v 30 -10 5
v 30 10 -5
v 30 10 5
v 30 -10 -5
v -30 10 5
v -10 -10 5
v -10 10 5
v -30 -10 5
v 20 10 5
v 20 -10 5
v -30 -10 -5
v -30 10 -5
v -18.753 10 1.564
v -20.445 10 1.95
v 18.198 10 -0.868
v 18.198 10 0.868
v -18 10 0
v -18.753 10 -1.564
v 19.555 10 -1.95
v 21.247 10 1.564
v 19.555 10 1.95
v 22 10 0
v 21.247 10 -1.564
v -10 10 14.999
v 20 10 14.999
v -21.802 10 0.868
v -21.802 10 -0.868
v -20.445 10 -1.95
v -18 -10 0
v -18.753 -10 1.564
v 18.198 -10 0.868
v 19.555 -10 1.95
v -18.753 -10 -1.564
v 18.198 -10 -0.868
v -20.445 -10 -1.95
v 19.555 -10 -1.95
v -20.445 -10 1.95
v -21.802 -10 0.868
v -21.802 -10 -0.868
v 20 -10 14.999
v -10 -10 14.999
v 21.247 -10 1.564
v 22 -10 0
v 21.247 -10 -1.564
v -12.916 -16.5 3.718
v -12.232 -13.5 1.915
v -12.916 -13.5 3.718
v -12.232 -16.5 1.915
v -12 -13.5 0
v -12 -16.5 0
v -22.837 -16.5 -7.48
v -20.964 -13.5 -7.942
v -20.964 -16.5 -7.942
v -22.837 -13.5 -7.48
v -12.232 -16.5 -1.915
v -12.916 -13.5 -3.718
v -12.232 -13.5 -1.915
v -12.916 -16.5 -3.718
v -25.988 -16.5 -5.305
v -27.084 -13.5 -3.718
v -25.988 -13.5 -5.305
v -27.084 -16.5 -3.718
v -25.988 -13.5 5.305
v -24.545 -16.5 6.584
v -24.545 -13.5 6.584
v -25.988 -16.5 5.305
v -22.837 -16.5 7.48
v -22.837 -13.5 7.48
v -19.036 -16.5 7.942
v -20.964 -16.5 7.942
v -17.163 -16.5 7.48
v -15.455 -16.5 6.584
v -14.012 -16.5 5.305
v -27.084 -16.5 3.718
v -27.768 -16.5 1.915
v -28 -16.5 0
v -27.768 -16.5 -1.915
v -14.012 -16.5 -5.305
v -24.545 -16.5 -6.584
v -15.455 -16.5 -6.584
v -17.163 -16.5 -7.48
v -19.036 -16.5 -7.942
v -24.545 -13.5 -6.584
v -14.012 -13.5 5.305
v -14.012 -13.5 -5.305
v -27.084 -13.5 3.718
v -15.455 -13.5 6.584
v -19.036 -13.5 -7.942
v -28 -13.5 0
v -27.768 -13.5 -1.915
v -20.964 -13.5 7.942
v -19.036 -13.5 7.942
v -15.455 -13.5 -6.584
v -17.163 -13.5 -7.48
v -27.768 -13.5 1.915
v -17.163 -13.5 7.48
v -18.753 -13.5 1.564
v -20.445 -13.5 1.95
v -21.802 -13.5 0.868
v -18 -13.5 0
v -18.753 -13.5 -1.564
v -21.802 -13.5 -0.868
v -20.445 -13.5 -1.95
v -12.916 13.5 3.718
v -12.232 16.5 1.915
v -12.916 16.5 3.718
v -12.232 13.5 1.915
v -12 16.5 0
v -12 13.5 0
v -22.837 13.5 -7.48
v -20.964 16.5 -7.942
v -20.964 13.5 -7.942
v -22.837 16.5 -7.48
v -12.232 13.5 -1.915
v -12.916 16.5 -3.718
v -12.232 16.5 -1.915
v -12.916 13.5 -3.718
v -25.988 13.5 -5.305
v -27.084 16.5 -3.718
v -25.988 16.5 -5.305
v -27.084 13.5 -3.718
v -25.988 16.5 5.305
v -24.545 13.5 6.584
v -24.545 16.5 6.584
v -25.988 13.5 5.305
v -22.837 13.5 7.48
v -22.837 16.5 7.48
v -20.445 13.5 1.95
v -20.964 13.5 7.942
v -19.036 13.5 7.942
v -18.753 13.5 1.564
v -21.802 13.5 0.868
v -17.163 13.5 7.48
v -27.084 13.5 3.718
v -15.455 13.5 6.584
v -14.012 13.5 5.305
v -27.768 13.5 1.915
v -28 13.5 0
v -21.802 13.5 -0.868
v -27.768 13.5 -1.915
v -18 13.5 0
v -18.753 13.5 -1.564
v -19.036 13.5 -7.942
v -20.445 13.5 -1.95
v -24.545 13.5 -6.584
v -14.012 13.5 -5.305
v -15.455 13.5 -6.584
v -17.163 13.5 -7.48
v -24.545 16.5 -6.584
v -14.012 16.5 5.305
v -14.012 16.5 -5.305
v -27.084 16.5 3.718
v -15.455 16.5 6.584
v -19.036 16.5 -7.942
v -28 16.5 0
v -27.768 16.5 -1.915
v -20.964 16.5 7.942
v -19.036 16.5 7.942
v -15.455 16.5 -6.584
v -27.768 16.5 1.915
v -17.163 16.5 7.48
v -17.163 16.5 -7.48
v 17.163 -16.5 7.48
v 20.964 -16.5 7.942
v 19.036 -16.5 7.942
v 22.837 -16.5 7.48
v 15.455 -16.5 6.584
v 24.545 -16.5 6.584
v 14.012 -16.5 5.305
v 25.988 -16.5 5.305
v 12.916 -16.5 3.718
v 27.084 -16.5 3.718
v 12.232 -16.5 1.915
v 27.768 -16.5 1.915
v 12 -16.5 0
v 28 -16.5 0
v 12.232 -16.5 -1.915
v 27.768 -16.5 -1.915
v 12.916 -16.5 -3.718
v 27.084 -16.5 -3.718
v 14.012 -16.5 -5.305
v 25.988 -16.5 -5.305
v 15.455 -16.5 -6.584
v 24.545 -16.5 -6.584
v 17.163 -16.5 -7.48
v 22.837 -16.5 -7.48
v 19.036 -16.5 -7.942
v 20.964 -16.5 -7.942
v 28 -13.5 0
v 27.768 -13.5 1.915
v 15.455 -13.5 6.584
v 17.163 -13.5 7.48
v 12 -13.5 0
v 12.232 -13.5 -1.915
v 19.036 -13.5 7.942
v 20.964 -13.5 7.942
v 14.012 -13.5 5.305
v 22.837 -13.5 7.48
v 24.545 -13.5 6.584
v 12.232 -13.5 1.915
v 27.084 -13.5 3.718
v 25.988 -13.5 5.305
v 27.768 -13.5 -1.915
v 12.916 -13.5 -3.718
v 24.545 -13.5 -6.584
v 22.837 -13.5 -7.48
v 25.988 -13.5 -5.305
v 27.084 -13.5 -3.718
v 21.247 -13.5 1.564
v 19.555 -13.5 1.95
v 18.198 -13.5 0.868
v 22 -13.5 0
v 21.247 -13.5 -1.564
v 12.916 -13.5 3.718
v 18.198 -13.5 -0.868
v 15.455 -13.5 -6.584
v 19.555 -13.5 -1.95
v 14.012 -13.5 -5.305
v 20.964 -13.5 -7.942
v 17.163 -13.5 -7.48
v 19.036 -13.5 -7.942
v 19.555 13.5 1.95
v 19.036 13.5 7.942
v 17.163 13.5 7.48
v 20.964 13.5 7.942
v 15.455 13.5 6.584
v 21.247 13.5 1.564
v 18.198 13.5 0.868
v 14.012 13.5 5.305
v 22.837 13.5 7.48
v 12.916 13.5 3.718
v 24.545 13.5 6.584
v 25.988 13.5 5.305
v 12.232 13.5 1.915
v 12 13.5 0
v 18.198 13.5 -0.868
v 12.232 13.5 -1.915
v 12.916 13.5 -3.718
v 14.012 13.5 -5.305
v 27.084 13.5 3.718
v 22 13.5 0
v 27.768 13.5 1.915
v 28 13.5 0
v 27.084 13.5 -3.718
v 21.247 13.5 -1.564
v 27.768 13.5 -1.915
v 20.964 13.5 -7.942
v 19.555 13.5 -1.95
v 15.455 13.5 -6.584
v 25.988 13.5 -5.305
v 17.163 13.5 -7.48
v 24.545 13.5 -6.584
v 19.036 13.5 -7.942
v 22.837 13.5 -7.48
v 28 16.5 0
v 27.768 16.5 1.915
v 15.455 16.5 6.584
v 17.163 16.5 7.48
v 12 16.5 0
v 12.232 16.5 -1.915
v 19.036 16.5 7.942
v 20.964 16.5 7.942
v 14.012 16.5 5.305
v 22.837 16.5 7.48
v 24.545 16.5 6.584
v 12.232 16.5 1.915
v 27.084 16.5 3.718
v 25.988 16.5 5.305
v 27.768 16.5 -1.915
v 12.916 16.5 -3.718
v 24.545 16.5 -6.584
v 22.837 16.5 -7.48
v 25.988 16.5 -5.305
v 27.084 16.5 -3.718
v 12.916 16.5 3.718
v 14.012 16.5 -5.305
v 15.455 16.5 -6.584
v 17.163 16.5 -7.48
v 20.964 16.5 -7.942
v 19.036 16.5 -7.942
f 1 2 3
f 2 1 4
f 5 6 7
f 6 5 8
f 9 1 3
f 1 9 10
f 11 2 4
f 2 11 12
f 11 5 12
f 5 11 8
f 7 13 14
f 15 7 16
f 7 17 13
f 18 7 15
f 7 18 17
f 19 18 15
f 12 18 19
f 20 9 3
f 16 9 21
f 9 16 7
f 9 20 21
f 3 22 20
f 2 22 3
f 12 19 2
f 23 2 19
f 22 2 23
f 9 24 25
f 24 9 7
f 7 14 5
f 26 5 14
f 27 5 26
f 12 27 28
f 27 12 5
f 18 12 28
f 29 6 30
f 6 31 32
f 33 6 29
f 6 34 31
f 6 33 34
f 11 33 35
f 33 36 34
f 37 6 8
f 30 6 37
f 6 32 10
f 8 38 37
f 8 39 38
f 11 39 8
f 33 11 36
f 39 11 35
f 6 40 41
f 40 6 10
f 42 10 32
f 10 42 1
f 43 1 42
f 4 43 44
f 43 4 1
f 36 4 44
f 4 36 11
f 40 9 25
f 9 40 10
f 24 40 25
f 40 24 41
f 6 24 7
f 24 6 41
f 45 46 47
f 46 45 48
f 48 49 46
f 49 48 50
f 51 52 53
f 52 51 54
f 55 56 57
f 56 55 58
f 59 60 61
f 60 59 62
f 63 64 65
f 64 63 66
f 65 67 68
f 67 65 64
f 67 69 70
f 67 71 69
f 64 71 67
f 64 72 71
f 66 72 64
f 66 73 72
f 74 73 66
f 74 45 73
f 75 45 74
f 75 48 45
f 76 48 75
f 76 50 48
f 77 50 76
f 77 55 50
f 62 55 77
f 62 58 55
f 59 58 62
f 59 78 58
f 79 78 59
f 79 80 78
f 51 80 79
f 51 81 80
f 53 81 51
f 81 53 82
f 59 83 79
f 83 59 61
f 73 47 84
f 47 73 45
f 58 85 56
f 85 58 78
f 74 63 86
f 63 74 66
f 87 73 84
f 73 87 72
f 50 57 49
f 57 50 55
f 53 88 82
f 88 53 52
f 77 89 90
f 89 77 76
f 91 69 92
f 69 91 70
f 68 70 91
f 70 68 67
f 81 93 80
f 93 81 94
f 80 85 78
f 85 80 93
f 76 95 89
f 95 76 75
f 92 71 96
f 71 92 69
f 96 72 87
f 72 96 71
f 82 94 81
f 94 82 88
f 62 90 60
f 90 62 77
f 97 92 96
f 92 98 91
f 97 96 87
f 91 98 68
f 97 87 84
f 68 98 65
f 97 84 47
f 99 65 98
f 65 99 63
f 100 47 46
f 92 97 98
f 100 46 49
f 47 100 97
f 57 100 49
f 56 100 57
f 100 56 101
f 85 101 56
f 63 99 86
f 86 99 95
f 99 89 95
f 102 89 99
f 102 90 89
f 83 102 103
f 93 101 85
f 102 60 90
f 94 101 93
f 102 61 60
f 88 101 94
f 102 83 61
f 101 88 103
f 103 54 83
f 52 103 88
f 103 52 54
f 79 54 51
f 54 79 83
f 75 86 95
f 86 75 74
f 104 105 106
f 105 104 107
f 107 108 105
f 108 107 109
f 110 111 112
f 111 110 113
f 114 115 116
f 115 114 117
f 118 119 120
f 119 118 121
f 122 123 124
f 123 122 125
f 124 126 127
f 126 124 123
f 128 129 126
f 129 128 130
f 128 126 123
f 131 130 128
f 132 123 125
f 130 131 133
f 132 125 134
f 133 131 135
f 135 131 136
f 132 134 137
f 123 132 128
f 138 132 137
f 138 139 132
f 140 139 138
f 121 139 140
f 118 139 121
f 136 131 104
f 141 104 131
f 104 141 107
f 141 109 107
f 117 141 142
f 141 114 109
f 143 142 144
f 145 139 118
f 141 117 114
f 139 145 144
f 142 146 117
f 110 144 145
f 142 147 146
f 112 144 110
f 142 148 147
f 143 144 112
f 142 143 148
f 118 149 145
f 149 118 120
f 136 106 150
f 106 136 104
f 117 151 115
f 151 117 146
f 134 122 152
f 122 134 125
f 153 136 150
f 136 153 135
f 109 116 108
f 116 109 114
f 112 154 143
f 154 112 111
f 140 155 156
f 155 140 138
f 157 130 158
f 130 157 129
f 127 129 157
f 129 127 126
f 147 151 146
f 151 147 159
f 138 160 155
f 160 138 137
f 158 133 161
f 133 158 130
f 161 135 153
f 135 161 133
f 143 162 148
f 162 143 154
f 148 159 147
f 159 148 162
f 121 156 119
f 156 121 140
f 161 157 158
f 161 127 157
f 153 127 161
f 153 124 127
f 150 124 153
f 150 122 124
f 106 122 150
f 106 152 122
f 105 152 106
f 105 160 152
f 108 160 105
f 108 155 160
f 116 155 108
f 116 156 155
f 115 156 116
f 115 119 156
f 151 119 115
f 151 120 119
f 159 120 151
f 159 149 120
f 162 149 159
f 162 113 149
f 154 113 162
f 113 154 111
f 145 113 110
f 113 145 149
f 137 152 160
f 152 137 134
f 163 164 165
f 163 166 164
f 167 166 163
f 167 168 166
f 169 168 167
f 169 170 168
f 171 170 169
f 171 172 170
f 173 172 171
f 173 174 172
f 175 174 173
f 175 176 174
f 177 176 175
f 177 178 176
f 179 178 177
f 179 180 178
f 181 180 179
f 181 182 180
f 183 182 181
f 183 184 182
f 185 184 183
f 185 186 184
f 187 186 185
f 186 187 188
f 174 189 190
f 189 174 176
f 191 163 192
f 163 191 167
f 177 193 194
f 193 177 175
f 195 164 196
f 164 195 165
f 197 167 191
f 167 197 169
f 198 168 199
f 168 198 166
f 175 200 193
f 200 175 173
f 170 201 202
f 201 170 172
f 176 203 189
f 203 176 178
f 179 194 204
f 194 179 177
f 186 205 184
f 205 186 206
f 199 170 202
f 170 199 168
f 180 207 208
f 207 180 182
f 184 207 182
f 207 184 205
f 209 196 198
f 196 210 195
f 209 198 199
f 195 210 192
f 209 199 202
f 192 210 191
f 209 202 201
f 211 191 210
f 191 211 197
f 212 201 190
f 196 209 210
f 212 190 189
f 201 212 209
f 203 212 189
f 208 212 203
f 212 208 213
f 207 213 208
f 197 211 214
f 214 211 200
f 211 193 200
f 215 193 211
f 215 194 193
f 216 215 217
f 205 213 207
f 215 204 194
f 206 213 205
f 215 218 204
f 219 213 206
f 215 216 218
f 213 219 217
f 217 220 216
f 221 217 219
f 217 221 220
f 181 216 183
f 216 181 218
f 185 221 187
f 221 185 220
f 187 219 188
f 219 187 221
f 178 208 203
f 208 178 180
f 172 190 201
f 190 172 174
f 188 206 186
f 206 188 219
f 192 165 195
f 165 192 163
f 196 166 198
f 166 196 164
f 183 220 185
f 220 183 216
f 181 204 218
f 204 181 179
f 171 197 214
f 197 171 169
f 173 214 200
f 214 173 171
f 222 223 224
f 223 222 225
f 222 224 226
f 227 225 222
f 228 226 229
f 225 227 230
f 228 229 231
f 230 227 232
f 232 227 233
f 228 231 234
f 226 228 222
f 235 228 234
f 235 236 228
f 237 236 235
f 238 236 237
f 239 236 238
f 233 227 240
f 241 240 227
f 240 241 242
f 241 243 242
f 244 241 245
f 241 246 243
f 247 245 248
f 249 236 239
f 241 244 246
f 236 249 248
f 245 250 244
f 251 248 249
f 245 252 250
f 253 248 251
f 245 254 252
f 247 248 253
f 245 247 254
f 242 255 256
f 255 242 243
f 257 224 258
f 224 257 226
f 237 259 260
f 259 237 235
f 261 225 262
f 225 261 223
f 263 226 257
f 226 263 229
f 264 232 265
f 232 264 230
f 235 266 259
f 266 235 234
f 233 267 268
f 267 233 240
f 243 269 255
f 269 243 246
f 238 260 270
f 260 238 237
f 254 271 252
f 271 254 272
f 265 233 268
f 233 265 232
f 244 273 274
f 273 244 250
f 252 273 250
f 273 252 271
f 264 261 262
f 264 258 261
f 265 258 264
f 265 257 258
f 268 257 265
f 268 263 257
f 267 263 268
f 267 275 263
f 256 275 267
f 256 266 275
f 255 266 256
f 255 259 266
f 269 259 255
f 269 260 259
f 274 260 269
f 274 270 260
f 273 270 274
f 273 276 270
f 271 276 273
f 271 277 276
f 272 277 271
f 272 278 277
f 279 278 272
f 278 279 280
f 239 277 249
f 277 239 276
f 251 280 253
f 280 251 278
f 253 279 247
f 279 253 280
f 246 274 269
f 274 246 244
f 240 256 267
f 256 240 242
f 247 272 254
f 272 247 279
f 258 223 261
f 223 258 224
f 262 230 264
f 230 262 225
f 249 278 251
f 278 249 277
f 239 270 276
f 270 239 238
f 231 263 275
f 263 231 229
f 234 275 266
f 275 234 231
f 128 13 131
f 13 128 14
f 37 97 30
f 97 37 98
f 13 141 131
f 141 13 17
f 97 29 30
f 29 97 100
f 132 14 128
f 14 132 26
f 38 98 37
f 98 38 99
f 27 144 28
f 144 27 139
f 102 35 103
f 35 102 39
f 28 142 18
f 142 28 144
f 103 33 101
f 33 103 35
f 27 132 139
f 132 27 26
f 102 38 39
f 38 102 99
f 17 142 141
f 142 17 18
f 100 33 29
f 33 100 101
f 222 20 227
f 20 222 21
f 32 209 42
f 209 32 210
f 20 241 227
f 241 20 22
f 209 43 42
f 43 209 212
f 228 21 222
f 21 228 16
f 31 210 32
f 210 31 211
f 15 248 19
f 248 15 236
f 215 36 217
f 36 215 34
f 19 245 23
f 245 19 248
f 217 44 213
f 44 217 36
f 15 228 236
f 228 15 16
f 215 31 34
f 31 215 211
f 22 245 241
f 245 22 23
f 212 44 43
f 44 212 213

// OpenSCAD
cube([60,20,10],center=true);
translate([5,0,10 - 0.001])
    cube([30,20,10],center=true);
translate([-20,-15,0])
    rotate([90,0,0])
    cylinder(h=3,r=8,center=true);
translate([-20,15,0])
    rotate([90,0,0])
    cylinder(h=3,r=8,center=true);
translate([20,-15,0])
    rotate([90,0,0])
    cylinder(h=3,r=8,center=true);
translate([20,15,0])
    rotate([90,0,0])
    cylinder(h=3,r=8,center=true);
translate([-20,0,0])
    rotate([90,0,0])
    cylinder(h=30,r=2,center=true);
translate([20,0,0])
    rotate([90,0,0])
    cylinder(h=30,r=2,center=true);
